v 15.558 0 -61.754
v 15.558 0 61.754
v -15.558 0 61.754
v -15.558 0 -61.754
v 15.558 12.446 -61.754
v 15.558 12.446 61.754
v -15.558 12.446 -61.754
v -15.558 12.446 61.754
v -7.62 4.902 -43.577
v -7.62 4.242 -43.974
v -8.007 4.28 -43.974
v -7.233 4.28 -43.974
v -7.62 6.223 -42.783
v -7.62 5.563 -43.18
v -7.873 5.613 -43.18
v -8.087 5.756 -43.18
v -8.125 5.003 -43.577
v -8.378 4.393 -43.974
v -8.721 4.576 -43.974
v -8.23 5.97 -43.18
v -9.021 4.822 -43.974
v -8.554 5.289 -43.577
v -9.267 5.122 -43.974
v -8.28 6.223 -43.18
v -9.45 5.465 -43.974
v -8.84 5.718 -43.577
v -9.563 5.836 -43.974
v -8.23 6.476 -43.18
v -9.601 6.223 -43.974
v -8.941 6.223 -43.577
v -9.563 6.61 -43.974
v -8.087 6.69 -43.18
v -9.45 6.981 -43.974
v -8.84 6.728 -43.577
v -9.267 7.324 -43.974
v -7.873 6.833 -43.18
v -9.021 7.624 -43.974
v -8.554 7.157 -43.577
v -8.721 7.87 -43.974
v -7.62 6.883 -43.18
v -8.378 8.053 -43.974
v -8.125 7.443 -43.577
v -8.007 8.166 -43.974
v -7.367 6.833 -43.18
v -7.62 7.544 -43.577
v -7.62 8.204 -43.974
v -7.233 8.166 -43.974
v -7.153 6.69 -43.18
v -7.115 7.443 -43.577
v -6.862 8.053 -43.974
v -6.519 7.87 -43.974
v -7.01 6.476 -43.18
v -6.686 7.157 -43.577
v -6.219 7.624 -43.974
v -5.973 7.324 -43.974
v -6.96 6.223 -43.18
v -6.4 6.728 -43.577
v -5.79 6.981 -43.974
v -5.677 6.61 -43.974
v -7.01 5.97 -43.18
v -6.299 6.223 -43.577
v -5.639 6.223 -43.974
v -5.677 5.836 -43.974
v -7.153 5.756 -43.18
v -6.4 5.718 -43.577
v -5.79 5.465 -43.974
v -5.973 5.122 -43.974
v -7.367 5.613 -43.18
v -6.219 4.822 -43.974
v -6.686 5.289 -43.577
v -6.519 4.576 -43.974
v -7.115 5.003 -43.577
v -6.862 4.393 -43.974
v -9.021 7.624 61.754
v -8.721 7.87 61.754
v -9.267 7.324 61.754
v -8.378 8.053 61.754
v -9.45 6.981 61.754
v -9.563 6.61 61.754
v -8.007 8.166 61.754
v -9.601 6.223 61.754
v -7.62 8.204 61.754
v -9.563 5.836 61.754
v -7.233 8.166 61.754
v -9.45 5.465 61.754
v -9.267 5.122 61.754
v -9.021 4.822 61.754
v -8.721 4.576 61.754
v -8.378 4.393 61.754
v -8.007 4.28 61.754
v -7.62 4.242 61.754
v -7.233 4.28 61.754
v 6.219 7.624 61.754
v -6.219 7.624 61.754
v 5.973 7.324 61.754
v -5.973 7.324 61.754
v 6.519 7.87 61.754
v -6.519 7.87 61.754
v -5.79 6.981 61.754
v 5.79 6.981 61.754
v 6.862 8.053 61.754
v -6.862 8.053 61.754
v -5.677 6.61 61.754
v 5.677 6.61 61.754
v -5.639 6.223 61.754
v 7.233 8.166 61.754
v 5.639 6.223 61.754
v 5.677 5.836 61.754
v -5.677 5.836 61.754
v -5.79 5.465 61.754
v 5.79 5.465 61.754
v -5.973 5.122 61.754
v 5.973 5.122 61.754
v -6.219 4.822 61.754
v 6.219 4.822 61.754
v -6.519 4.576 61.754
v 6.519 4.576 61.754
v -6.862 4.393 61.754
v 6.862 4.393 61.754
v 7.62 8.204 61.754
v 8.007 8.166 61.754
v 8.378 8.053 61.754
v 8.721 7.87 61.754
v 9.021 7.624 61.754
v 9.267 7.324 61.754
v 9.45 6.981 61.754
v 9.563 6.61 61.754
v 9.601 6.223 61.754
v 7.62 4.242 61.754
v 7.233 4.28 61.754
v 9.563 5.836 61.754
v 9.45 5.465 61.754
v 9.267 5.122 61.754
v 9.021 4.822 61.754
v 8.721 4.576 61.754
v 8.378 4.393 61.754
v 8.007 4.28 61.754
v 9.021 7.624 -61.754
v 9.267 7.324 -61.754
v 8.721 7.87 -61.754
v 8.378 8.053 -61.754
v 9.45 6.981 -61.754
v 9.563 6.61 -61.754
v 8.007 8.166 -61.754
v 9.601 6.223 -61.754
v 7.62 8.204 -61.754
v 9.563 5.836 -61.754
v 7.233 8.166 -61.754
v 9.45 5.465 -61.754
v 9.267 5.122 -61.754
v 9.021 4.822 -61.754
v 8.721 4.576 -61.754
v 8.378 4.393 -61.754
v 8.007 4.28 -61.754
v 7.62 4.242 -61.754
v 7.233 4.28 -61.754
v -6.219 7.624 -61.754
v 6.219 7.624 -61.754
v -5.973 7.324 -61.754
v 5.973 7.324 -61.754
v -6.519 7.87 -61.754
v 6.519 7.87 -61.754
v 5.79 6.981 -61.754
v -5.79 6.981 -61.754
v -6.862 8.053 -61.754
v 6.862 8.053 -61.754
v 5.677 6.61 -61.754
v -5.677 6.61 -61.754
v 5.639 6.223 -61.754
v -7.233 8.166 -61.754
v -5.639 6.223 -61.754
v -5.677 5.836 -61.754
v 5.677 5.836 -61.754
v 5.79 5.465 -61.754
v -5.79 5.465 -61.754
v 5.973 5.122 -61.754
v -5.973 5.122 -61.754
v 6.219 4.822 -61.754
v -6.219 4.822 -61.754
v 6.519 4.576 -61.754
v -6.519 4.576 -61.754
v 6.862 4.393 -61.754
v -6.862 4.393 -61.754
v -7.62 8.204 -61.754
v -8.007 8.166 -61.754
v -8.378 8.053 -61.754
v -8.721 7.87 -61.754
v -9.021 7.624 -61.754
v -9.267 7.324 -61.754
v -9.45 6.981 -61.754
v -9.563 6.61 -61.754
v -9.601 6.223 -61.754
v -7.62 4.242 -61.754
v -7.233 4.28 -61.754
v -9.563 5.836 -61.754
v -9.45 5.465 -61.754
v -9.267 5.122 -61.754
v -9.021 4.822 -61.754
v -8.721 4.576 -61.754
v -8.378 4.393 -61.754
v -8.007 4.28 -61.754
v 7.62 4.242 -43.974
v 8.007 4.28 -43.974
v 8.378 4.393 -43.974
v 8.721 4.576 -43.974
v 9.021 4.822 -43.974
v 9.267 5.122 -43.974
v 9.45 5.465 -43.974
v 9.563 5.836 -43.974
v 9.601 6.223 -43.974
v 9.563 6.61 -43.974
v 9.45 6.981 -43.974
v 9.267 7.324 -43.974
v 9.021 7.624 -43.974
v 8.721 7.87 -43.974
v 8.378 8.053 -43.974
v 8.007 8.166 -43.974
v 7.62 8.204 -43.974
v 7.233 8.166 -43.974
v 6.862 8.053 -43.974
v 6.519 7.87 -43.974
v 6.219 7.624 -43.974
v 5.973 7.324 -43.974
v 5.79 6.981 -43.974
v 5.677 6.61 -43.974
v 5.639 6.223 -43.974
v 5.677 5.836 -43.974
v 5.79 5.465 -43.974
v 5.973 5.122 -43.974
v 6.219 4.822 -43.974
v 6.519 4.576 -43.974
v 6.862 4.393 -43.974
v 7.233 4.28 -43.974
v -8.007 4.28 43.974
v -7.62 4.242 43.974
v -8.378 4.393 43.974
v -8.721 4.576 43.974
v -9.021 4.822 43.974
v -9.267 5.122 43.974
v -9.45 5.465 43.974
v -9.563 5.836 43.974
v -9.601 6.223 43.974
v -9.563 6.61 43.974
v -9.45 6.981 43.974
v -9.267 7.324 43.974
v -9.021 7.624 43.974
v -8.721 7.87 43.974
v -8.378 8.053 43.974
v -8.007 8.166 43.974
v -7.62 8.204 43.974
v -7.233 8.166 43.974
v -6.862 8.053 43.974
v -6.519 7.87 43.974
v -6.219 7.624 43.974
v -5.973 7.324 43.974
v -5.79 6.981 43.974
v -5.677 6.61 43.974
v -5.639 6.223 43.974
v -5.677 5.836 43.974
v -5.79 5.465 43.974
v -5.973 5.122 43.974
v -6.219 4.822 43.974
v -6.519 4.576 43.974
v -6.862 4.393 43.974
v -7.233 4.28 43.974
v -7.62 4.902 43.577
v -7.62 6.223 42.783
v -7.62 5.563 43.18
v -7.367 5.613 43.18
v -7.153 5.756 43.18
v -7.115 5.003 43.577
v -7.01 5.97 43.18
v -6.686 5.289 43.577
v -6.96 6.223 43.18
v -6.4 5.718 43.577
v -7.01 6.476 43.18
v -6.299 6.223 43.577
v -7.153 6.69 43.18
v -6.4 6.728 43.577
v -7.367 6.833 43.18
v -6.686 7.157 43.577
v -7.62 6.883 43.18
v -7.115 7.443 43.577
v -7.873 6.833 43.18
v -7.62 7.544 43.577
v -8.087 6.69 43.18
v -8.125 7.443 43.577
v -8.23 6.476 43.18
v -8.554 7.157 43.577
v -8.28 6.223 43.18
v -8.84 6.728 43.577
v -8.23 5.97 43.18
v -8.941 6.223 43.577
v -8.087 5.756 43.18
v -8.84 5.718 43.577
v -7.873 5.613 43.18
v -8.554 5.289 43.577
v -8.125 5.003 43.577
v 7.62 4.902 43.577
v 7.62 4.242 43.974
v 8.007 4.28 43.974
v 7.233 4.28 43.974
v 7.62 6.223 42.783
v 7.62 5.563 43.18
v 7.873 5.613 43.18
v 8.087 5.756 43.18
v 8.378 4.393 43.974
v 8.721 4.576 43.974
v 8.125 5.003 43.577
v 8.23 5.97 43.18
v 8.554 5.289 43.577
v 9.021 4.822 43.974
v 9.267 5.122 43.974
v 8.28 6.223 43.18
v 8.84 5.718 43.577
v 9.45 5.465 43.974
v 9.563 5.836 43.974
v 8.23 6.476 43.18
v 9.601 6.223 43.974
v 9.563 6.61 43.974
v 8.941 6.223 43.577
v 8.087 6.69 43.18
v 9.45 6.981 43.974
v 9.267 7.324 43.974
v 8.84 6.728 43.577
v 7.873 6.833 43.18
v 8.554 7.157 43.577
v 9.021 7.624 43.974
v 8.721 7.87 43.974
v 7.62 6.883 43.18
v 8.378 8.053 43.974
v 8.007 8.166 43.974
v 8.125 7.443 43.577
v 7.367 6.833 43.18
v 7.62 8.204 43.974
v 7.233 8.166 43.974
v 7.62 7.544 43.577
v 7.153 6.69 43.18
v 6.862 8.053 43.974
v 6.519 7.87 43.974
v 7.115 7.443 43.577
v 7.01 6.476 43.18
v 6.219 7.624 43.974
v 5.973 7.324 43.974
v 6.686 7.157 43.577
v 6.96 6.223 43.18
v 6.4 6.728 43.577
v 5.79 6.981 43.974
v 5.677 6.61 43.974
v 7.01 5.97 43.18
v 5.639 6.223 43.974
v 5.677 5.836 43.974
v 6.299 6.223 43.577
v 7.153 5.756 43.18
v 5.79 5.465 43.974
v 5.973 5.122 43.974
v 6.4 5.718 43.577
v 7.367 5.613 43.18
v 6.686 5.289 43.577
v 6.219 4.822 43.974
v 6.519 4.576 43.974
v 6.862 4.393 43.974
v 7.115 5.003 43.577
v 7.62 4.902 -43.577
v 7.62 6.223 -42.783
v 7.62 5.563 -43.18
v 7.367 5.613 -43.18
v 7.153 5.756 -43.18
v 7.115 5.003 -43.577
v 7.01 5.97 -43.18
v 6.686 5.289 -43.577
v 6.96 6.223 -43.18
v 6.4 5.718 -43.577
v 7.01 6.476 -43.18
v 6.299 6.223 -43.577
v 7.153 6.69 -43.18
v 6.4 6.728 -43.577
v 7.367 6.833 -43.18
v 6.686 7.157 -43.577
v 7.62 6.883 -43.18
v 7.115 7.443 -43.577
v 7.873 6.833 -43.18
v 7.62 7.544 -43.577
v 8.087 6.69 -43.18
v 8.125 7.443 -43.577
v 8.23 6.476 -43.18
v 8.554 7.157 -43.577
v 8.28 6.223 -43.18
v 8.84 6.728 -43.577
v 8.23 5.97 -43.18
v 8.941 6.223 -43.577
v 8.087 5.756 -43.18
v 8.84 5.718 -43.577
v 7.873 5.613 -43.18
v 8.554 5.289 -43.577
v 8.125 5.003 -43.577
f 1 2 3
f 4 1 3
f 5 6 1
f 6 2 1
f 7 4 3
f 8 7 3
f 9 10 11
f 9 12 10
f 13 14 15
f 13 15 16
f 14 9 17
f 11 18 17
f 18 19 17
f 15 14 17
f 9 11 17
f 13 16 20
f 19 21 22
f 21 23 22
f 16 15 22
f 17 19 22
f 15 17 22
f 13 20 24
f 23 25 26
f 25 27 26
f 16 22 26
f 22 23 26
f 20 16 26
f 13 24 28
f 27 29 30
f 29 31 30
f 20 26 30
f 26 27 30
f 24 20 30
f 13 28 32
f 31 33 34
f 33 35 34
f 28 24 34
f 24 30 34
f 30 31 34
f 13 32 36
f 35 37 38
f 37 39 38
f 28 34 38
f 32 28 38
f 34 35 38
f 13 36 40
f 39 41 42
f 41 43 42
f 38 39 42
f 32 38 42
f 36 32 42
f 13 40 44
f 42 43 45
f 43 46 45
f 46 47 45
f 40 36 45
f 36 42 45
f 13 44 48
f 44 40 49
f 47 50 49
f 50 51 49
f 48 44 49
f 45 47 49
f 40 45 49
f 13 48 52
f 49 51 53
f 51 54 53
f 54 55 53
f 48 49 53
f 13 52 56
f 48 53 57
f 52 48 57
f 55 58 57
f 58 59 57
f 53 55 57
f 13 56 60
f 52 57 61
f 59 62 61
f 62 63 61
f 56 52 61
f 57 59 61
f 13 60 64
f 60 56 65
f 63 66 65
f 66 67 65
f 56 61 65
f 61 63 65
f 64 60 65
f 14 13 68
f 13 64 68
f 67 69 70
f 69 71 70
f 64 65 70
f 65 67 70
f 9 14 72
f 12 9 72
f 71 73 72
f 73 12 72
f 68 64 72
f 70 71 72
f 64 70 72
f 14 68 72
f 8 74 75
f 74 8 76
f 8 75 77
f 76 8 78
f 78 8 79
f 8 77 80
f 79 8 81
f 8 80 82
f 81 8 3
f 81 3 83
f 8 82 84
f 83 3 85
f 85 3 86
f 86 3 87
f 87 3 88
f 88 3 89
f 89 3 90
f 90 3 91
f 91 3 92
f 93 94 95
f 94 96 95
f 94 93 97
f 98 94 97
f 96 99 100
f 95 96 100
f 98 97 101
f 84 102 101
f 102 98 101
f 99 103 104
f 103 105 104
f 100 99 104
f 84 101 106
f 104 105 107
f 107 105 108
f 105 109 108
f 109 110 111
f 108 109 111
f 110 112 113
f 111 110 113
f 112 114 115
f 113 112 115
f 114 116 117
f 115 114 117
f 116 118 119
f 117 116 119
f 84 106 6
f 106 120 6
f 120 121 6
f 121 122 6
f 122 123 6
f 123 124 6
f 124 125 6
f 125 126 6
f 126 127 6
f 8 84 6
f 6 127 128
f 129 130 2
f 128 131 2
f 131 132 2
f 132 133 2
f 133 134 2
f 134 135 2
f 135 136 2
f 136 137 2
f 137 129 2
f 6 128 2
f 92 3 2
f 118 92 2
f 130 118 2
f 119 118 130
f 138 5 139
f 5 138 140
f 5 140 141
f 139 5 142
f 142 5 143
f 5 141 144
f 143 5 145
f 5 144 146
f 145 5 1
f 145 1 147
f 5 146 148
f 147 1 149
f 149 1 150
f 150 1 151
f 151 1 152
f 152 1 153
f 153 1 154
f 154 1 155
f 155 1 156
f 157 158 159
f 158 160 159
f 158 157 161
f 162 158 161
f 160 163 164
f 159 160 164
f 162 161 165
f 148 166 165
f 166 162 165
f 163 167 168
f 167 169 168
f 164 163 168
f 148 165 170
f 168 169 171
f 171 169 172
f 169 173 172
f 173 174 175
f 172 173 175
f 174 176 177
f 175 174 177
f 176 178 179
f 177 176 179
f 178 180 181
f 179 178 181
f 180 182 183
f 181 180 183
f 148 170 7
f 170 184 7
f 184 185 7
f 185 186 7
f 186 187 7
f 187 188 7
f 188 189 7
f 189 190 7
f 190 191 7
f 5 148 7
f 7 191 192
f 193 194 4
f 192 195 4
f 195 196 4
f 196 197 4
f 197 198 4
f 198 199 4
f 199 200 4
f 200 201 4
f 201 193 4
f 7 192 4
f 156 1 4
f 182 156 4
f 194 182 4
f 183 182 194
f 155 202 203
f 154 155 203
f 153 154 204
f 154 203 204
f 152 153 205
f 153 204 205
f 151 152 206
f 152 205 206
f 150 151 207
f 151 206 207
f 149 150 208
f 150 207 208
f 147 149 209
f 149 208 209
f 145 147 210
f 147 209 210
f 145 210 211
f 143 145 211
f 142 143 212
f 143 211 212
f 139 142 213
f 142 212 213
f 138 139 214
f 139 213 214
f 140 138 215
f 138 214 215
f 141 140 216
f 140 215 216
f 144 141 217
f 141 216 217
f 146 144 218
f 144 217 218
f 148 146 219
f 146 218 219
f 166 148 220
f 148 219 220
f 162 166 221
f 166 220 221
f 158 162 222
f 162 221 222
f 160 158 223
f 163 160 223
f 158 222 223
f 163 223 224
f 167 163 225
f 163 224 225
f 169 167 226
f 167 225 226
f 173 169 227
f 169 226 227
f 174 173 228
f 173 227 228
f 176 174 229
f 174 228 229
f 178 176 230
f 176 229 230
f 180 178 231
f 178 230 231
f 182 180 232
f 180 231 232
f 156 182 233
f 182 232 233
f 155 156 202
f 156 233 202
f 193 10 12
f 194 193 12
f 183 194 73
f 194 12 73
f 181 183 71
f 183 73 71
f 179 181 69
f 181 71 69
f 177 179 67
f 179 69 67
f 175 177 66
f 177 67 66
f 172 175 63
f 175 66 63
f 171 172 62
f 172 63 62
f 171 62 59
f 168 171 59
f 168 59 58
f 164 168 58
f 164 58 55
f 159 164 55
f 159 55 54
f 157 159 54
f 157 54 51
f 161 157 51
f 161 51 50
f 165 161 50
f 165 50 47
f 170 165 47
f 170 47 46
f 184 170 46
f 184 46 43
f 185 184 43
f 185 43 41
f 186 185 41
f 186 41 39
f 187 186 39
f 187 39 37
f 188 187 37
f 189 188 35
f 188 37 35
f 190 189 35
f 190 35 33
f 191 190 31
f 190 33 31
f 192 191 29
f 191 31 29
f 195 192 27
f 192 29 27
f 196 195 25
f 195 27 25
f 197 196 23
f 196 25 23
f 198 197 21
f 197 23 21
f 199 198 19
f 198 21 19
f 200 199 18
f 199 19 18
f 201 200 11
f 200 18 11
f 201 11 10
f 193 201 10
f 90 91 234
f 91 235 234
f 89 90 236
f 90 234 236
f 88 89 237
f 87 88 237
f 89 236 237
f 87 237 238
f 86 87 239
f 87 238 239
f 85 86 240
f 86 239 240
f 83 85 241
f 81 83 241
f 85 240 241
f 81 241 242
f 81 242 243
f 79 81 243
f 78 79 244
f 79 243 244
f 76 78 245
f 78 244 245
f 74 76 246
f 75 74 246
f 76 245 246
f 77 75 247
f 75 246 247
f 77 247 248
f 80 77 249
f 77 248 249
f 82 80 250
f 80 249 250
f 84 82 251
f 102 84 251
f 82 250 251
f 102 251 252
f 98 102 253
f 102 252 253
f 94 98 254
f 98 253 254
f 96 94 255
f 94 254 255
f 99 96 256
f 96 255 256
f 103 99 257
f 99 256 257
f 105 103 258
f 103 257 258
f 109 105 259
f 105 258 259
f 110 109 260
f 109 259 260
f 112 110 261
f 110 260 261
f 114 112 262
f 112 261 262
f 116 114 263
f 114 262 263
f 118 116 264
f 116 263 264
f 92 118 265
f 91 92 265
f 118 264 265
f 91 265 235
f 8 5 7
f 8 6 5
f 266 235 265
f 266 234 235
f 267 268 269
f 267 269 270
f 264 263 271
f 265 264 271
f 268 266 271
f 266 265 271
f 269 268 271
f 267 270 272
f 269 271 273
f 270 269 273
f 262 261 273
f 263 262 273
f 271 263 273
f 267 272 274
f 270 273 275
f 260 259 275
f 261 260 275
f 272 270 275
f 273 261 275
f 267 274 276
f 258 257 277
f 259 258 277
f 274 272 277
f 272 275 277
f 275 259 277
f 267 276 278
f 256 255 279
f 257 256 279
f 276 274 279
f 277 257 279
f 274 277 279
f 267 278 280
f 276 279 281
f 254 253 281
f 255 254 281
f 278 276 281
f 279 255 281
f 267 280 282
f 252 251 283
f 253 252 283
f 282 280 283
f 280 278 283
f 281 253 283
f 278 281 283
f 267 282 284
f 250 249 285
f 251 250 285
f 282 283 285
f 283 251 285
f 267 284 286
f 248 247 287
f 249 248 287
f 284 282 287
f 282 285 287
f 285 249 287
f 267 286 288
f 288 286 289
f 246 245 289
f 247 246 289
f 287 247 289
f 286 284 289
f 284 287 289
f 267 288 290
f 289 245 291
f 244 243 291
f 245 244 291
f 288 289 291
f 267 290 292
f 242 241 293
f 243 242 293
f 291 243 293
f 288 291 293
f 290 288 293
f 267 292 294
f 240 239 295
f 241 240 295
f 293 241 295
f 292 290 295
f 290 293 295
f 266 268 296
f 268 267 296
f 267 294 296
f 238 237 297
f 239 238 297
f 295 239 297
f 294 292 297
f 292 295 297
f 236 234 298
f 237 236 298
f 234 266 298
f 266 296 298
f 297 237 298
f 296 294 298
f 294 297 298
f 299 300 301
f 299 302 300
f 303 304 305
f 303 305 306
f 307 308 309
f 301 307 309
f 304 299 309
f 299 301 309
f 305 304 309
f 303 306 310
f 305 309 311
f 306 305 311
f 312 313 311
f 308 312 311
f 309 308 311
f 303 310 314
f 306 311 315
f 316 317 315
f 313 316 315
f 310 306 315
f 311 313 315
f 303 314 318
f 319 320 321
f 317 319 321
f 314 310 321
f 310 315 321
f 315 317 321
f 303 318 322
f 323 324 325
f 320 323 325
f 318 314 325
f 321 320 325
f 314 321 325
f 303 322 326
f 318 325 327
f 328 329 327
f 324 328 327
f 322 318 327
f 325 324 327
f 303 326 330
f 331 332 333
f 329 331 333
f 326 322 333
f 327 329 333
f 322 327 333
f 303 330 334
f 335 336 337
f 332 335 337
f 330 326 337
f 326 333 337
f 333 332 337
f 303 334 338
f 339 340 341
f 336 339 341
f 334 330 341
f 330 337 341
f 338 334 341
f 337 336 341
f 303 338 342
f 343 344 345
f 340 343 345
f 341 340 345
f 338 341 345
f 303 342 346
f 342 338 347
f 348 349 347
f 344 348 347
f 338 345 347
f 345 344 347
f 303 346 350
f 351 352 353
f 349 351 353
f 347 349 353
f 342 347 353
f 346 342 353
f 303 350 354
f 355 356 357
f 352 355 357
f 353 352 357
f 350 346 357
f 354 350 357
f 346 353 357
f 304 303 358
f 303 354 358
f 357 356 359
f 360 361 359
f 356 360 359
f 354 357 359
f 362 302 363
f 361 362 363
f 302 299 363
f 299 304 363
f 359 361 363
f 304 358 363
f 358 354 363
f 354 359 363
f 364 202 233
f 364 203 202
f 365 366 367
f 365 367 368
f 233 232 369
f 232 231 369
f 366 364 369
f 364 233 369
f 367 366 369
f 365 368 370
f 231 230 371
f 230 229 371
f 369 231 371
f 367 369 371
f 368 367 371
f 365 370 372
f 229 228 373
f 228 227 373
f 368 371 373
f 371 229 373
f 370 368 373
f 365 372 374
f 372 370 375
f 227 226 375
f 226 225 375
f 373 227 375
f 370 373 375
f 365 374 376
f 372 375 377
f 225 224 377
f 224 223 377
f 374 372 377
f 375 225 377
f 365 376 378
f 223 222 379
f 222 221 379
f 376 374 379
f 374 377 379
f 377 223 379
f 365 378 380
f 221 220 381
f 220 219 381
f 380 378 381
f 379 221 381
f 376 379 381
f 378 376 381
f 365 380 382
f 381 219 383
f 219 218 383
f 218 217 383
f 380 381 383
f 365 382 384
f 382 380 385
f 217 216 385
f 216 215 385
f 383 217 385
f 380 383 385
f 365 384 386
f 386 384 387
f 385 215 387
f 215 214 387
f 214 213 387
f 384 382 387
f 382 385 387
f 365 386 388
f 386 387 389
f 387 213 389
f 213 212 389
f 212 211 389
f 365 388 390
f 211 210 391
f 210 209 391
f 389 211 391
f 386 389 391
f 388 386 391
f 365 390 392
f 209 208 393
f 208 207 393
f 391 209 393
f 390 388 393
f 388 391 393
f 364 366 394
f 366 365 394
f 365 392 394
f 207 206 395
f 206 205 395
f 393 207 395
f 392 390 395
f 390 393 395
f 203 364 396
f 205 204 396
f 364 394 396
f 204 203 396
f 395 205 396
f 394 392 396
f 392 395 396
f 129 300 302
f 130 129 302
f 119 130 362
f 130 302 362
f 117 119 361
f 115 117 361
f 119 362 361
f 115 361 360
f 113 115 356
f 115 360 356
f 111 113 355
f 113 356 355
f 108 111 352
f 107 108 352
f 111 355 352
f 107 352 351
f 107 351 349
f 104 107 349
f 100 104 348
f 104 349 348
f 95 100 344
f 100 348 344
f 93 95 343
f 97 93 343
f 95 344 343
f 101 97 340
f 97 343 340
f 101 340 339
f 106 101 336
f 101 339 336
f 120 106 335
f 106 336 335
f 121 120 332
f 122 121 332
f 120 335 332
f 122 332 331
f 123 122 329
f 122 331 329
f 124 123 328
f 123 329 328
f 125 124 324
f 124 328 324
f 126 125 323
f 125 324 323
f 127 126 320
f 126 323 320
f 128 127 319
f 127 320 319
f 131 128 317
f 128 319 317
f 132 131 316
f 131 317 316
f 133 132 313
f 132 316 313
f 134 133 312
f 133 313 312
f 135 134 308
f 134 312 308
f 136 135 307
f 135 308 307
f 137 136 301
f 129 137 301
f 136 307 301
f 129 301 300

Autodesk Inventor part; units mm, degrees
ref_plane "YZ Plane" through (0, 0, 0) normal (1, 0, 0) x (0, 1, 0)
ref_plane "XZ Plane" through (0, 0, 0) normal (0, 1, 0) x (-1, 0, 0)
sketch "Sketch1" plane through (0, 0, 0) normal (0, 1, 0) x (-1, 0, 0)
  line L0 (-15.5575, -61.7537) -> (15.5575, -61.7537)
  line L1 (15.5575, -61.7537) -> (15.5575, 61.7538)
  line L2 (15.5575, 61.7538) -> (-15.5575, 61.7538)
  line L3 (-15.5575, 61.7538) -> (-15.5575, -61.7537)
  line L4 (-15.5575, -61.7537) -> (15.5575, 61.7538) construction
  line L5 (15.5575, -61.7537) -> (-15.5575, 61.7538) construction
  point P0 (0, 0)
  dimension "d0" = 123.5075
  dimension "d1" = 31.115
extrude "Extrusion1" add sketch "Sketch1" along normal blind 12.446
sketch "Sketch2" plane through (-15.5575, 0, 61.7538) normal (0, 0, 1) x (1, 0, 0)
  line L0 (15.5575, 17.8749) -> (15.5575, -12.6883)
  line L1 (35.533, 6.223) -> (0.122, 6.223)
  line L2 (0, 0) -> (31.115, 0) projected
  line L3 (31.115, 0) -> (31.115, 12.446) projected
  point P0 (15.5575, 0)
  point P1 (15.5575, 0)
  point P2 (15.5575, 0)
  point P3 (31.115, 6.223)
  point P4 (7.9375, 6.223)
  point P5 (23.1775, 6.223)
  dimension "d4" = 15.24
hole "Hole1" at (-7.62, 6.223, 61.7538) at (7.62, 6.223, 61.7538) direction (0, 0, -1) diameter 3.9624 depth 17.78 tip angle 118 thread size "10-32 UNF" class "2B" standard "ANSI Unified Screw Threads"
ref_plane "Work Plane2" through (15.5575, 0, 0) normal (0, 0, -1) x (-1, 0, 0)
mirror "Mirror1" about plane through (15.5575, 0, 0) normal (0, 0, -1) of "Hole1"
properties part number "Fixture_Base_Support-02"
